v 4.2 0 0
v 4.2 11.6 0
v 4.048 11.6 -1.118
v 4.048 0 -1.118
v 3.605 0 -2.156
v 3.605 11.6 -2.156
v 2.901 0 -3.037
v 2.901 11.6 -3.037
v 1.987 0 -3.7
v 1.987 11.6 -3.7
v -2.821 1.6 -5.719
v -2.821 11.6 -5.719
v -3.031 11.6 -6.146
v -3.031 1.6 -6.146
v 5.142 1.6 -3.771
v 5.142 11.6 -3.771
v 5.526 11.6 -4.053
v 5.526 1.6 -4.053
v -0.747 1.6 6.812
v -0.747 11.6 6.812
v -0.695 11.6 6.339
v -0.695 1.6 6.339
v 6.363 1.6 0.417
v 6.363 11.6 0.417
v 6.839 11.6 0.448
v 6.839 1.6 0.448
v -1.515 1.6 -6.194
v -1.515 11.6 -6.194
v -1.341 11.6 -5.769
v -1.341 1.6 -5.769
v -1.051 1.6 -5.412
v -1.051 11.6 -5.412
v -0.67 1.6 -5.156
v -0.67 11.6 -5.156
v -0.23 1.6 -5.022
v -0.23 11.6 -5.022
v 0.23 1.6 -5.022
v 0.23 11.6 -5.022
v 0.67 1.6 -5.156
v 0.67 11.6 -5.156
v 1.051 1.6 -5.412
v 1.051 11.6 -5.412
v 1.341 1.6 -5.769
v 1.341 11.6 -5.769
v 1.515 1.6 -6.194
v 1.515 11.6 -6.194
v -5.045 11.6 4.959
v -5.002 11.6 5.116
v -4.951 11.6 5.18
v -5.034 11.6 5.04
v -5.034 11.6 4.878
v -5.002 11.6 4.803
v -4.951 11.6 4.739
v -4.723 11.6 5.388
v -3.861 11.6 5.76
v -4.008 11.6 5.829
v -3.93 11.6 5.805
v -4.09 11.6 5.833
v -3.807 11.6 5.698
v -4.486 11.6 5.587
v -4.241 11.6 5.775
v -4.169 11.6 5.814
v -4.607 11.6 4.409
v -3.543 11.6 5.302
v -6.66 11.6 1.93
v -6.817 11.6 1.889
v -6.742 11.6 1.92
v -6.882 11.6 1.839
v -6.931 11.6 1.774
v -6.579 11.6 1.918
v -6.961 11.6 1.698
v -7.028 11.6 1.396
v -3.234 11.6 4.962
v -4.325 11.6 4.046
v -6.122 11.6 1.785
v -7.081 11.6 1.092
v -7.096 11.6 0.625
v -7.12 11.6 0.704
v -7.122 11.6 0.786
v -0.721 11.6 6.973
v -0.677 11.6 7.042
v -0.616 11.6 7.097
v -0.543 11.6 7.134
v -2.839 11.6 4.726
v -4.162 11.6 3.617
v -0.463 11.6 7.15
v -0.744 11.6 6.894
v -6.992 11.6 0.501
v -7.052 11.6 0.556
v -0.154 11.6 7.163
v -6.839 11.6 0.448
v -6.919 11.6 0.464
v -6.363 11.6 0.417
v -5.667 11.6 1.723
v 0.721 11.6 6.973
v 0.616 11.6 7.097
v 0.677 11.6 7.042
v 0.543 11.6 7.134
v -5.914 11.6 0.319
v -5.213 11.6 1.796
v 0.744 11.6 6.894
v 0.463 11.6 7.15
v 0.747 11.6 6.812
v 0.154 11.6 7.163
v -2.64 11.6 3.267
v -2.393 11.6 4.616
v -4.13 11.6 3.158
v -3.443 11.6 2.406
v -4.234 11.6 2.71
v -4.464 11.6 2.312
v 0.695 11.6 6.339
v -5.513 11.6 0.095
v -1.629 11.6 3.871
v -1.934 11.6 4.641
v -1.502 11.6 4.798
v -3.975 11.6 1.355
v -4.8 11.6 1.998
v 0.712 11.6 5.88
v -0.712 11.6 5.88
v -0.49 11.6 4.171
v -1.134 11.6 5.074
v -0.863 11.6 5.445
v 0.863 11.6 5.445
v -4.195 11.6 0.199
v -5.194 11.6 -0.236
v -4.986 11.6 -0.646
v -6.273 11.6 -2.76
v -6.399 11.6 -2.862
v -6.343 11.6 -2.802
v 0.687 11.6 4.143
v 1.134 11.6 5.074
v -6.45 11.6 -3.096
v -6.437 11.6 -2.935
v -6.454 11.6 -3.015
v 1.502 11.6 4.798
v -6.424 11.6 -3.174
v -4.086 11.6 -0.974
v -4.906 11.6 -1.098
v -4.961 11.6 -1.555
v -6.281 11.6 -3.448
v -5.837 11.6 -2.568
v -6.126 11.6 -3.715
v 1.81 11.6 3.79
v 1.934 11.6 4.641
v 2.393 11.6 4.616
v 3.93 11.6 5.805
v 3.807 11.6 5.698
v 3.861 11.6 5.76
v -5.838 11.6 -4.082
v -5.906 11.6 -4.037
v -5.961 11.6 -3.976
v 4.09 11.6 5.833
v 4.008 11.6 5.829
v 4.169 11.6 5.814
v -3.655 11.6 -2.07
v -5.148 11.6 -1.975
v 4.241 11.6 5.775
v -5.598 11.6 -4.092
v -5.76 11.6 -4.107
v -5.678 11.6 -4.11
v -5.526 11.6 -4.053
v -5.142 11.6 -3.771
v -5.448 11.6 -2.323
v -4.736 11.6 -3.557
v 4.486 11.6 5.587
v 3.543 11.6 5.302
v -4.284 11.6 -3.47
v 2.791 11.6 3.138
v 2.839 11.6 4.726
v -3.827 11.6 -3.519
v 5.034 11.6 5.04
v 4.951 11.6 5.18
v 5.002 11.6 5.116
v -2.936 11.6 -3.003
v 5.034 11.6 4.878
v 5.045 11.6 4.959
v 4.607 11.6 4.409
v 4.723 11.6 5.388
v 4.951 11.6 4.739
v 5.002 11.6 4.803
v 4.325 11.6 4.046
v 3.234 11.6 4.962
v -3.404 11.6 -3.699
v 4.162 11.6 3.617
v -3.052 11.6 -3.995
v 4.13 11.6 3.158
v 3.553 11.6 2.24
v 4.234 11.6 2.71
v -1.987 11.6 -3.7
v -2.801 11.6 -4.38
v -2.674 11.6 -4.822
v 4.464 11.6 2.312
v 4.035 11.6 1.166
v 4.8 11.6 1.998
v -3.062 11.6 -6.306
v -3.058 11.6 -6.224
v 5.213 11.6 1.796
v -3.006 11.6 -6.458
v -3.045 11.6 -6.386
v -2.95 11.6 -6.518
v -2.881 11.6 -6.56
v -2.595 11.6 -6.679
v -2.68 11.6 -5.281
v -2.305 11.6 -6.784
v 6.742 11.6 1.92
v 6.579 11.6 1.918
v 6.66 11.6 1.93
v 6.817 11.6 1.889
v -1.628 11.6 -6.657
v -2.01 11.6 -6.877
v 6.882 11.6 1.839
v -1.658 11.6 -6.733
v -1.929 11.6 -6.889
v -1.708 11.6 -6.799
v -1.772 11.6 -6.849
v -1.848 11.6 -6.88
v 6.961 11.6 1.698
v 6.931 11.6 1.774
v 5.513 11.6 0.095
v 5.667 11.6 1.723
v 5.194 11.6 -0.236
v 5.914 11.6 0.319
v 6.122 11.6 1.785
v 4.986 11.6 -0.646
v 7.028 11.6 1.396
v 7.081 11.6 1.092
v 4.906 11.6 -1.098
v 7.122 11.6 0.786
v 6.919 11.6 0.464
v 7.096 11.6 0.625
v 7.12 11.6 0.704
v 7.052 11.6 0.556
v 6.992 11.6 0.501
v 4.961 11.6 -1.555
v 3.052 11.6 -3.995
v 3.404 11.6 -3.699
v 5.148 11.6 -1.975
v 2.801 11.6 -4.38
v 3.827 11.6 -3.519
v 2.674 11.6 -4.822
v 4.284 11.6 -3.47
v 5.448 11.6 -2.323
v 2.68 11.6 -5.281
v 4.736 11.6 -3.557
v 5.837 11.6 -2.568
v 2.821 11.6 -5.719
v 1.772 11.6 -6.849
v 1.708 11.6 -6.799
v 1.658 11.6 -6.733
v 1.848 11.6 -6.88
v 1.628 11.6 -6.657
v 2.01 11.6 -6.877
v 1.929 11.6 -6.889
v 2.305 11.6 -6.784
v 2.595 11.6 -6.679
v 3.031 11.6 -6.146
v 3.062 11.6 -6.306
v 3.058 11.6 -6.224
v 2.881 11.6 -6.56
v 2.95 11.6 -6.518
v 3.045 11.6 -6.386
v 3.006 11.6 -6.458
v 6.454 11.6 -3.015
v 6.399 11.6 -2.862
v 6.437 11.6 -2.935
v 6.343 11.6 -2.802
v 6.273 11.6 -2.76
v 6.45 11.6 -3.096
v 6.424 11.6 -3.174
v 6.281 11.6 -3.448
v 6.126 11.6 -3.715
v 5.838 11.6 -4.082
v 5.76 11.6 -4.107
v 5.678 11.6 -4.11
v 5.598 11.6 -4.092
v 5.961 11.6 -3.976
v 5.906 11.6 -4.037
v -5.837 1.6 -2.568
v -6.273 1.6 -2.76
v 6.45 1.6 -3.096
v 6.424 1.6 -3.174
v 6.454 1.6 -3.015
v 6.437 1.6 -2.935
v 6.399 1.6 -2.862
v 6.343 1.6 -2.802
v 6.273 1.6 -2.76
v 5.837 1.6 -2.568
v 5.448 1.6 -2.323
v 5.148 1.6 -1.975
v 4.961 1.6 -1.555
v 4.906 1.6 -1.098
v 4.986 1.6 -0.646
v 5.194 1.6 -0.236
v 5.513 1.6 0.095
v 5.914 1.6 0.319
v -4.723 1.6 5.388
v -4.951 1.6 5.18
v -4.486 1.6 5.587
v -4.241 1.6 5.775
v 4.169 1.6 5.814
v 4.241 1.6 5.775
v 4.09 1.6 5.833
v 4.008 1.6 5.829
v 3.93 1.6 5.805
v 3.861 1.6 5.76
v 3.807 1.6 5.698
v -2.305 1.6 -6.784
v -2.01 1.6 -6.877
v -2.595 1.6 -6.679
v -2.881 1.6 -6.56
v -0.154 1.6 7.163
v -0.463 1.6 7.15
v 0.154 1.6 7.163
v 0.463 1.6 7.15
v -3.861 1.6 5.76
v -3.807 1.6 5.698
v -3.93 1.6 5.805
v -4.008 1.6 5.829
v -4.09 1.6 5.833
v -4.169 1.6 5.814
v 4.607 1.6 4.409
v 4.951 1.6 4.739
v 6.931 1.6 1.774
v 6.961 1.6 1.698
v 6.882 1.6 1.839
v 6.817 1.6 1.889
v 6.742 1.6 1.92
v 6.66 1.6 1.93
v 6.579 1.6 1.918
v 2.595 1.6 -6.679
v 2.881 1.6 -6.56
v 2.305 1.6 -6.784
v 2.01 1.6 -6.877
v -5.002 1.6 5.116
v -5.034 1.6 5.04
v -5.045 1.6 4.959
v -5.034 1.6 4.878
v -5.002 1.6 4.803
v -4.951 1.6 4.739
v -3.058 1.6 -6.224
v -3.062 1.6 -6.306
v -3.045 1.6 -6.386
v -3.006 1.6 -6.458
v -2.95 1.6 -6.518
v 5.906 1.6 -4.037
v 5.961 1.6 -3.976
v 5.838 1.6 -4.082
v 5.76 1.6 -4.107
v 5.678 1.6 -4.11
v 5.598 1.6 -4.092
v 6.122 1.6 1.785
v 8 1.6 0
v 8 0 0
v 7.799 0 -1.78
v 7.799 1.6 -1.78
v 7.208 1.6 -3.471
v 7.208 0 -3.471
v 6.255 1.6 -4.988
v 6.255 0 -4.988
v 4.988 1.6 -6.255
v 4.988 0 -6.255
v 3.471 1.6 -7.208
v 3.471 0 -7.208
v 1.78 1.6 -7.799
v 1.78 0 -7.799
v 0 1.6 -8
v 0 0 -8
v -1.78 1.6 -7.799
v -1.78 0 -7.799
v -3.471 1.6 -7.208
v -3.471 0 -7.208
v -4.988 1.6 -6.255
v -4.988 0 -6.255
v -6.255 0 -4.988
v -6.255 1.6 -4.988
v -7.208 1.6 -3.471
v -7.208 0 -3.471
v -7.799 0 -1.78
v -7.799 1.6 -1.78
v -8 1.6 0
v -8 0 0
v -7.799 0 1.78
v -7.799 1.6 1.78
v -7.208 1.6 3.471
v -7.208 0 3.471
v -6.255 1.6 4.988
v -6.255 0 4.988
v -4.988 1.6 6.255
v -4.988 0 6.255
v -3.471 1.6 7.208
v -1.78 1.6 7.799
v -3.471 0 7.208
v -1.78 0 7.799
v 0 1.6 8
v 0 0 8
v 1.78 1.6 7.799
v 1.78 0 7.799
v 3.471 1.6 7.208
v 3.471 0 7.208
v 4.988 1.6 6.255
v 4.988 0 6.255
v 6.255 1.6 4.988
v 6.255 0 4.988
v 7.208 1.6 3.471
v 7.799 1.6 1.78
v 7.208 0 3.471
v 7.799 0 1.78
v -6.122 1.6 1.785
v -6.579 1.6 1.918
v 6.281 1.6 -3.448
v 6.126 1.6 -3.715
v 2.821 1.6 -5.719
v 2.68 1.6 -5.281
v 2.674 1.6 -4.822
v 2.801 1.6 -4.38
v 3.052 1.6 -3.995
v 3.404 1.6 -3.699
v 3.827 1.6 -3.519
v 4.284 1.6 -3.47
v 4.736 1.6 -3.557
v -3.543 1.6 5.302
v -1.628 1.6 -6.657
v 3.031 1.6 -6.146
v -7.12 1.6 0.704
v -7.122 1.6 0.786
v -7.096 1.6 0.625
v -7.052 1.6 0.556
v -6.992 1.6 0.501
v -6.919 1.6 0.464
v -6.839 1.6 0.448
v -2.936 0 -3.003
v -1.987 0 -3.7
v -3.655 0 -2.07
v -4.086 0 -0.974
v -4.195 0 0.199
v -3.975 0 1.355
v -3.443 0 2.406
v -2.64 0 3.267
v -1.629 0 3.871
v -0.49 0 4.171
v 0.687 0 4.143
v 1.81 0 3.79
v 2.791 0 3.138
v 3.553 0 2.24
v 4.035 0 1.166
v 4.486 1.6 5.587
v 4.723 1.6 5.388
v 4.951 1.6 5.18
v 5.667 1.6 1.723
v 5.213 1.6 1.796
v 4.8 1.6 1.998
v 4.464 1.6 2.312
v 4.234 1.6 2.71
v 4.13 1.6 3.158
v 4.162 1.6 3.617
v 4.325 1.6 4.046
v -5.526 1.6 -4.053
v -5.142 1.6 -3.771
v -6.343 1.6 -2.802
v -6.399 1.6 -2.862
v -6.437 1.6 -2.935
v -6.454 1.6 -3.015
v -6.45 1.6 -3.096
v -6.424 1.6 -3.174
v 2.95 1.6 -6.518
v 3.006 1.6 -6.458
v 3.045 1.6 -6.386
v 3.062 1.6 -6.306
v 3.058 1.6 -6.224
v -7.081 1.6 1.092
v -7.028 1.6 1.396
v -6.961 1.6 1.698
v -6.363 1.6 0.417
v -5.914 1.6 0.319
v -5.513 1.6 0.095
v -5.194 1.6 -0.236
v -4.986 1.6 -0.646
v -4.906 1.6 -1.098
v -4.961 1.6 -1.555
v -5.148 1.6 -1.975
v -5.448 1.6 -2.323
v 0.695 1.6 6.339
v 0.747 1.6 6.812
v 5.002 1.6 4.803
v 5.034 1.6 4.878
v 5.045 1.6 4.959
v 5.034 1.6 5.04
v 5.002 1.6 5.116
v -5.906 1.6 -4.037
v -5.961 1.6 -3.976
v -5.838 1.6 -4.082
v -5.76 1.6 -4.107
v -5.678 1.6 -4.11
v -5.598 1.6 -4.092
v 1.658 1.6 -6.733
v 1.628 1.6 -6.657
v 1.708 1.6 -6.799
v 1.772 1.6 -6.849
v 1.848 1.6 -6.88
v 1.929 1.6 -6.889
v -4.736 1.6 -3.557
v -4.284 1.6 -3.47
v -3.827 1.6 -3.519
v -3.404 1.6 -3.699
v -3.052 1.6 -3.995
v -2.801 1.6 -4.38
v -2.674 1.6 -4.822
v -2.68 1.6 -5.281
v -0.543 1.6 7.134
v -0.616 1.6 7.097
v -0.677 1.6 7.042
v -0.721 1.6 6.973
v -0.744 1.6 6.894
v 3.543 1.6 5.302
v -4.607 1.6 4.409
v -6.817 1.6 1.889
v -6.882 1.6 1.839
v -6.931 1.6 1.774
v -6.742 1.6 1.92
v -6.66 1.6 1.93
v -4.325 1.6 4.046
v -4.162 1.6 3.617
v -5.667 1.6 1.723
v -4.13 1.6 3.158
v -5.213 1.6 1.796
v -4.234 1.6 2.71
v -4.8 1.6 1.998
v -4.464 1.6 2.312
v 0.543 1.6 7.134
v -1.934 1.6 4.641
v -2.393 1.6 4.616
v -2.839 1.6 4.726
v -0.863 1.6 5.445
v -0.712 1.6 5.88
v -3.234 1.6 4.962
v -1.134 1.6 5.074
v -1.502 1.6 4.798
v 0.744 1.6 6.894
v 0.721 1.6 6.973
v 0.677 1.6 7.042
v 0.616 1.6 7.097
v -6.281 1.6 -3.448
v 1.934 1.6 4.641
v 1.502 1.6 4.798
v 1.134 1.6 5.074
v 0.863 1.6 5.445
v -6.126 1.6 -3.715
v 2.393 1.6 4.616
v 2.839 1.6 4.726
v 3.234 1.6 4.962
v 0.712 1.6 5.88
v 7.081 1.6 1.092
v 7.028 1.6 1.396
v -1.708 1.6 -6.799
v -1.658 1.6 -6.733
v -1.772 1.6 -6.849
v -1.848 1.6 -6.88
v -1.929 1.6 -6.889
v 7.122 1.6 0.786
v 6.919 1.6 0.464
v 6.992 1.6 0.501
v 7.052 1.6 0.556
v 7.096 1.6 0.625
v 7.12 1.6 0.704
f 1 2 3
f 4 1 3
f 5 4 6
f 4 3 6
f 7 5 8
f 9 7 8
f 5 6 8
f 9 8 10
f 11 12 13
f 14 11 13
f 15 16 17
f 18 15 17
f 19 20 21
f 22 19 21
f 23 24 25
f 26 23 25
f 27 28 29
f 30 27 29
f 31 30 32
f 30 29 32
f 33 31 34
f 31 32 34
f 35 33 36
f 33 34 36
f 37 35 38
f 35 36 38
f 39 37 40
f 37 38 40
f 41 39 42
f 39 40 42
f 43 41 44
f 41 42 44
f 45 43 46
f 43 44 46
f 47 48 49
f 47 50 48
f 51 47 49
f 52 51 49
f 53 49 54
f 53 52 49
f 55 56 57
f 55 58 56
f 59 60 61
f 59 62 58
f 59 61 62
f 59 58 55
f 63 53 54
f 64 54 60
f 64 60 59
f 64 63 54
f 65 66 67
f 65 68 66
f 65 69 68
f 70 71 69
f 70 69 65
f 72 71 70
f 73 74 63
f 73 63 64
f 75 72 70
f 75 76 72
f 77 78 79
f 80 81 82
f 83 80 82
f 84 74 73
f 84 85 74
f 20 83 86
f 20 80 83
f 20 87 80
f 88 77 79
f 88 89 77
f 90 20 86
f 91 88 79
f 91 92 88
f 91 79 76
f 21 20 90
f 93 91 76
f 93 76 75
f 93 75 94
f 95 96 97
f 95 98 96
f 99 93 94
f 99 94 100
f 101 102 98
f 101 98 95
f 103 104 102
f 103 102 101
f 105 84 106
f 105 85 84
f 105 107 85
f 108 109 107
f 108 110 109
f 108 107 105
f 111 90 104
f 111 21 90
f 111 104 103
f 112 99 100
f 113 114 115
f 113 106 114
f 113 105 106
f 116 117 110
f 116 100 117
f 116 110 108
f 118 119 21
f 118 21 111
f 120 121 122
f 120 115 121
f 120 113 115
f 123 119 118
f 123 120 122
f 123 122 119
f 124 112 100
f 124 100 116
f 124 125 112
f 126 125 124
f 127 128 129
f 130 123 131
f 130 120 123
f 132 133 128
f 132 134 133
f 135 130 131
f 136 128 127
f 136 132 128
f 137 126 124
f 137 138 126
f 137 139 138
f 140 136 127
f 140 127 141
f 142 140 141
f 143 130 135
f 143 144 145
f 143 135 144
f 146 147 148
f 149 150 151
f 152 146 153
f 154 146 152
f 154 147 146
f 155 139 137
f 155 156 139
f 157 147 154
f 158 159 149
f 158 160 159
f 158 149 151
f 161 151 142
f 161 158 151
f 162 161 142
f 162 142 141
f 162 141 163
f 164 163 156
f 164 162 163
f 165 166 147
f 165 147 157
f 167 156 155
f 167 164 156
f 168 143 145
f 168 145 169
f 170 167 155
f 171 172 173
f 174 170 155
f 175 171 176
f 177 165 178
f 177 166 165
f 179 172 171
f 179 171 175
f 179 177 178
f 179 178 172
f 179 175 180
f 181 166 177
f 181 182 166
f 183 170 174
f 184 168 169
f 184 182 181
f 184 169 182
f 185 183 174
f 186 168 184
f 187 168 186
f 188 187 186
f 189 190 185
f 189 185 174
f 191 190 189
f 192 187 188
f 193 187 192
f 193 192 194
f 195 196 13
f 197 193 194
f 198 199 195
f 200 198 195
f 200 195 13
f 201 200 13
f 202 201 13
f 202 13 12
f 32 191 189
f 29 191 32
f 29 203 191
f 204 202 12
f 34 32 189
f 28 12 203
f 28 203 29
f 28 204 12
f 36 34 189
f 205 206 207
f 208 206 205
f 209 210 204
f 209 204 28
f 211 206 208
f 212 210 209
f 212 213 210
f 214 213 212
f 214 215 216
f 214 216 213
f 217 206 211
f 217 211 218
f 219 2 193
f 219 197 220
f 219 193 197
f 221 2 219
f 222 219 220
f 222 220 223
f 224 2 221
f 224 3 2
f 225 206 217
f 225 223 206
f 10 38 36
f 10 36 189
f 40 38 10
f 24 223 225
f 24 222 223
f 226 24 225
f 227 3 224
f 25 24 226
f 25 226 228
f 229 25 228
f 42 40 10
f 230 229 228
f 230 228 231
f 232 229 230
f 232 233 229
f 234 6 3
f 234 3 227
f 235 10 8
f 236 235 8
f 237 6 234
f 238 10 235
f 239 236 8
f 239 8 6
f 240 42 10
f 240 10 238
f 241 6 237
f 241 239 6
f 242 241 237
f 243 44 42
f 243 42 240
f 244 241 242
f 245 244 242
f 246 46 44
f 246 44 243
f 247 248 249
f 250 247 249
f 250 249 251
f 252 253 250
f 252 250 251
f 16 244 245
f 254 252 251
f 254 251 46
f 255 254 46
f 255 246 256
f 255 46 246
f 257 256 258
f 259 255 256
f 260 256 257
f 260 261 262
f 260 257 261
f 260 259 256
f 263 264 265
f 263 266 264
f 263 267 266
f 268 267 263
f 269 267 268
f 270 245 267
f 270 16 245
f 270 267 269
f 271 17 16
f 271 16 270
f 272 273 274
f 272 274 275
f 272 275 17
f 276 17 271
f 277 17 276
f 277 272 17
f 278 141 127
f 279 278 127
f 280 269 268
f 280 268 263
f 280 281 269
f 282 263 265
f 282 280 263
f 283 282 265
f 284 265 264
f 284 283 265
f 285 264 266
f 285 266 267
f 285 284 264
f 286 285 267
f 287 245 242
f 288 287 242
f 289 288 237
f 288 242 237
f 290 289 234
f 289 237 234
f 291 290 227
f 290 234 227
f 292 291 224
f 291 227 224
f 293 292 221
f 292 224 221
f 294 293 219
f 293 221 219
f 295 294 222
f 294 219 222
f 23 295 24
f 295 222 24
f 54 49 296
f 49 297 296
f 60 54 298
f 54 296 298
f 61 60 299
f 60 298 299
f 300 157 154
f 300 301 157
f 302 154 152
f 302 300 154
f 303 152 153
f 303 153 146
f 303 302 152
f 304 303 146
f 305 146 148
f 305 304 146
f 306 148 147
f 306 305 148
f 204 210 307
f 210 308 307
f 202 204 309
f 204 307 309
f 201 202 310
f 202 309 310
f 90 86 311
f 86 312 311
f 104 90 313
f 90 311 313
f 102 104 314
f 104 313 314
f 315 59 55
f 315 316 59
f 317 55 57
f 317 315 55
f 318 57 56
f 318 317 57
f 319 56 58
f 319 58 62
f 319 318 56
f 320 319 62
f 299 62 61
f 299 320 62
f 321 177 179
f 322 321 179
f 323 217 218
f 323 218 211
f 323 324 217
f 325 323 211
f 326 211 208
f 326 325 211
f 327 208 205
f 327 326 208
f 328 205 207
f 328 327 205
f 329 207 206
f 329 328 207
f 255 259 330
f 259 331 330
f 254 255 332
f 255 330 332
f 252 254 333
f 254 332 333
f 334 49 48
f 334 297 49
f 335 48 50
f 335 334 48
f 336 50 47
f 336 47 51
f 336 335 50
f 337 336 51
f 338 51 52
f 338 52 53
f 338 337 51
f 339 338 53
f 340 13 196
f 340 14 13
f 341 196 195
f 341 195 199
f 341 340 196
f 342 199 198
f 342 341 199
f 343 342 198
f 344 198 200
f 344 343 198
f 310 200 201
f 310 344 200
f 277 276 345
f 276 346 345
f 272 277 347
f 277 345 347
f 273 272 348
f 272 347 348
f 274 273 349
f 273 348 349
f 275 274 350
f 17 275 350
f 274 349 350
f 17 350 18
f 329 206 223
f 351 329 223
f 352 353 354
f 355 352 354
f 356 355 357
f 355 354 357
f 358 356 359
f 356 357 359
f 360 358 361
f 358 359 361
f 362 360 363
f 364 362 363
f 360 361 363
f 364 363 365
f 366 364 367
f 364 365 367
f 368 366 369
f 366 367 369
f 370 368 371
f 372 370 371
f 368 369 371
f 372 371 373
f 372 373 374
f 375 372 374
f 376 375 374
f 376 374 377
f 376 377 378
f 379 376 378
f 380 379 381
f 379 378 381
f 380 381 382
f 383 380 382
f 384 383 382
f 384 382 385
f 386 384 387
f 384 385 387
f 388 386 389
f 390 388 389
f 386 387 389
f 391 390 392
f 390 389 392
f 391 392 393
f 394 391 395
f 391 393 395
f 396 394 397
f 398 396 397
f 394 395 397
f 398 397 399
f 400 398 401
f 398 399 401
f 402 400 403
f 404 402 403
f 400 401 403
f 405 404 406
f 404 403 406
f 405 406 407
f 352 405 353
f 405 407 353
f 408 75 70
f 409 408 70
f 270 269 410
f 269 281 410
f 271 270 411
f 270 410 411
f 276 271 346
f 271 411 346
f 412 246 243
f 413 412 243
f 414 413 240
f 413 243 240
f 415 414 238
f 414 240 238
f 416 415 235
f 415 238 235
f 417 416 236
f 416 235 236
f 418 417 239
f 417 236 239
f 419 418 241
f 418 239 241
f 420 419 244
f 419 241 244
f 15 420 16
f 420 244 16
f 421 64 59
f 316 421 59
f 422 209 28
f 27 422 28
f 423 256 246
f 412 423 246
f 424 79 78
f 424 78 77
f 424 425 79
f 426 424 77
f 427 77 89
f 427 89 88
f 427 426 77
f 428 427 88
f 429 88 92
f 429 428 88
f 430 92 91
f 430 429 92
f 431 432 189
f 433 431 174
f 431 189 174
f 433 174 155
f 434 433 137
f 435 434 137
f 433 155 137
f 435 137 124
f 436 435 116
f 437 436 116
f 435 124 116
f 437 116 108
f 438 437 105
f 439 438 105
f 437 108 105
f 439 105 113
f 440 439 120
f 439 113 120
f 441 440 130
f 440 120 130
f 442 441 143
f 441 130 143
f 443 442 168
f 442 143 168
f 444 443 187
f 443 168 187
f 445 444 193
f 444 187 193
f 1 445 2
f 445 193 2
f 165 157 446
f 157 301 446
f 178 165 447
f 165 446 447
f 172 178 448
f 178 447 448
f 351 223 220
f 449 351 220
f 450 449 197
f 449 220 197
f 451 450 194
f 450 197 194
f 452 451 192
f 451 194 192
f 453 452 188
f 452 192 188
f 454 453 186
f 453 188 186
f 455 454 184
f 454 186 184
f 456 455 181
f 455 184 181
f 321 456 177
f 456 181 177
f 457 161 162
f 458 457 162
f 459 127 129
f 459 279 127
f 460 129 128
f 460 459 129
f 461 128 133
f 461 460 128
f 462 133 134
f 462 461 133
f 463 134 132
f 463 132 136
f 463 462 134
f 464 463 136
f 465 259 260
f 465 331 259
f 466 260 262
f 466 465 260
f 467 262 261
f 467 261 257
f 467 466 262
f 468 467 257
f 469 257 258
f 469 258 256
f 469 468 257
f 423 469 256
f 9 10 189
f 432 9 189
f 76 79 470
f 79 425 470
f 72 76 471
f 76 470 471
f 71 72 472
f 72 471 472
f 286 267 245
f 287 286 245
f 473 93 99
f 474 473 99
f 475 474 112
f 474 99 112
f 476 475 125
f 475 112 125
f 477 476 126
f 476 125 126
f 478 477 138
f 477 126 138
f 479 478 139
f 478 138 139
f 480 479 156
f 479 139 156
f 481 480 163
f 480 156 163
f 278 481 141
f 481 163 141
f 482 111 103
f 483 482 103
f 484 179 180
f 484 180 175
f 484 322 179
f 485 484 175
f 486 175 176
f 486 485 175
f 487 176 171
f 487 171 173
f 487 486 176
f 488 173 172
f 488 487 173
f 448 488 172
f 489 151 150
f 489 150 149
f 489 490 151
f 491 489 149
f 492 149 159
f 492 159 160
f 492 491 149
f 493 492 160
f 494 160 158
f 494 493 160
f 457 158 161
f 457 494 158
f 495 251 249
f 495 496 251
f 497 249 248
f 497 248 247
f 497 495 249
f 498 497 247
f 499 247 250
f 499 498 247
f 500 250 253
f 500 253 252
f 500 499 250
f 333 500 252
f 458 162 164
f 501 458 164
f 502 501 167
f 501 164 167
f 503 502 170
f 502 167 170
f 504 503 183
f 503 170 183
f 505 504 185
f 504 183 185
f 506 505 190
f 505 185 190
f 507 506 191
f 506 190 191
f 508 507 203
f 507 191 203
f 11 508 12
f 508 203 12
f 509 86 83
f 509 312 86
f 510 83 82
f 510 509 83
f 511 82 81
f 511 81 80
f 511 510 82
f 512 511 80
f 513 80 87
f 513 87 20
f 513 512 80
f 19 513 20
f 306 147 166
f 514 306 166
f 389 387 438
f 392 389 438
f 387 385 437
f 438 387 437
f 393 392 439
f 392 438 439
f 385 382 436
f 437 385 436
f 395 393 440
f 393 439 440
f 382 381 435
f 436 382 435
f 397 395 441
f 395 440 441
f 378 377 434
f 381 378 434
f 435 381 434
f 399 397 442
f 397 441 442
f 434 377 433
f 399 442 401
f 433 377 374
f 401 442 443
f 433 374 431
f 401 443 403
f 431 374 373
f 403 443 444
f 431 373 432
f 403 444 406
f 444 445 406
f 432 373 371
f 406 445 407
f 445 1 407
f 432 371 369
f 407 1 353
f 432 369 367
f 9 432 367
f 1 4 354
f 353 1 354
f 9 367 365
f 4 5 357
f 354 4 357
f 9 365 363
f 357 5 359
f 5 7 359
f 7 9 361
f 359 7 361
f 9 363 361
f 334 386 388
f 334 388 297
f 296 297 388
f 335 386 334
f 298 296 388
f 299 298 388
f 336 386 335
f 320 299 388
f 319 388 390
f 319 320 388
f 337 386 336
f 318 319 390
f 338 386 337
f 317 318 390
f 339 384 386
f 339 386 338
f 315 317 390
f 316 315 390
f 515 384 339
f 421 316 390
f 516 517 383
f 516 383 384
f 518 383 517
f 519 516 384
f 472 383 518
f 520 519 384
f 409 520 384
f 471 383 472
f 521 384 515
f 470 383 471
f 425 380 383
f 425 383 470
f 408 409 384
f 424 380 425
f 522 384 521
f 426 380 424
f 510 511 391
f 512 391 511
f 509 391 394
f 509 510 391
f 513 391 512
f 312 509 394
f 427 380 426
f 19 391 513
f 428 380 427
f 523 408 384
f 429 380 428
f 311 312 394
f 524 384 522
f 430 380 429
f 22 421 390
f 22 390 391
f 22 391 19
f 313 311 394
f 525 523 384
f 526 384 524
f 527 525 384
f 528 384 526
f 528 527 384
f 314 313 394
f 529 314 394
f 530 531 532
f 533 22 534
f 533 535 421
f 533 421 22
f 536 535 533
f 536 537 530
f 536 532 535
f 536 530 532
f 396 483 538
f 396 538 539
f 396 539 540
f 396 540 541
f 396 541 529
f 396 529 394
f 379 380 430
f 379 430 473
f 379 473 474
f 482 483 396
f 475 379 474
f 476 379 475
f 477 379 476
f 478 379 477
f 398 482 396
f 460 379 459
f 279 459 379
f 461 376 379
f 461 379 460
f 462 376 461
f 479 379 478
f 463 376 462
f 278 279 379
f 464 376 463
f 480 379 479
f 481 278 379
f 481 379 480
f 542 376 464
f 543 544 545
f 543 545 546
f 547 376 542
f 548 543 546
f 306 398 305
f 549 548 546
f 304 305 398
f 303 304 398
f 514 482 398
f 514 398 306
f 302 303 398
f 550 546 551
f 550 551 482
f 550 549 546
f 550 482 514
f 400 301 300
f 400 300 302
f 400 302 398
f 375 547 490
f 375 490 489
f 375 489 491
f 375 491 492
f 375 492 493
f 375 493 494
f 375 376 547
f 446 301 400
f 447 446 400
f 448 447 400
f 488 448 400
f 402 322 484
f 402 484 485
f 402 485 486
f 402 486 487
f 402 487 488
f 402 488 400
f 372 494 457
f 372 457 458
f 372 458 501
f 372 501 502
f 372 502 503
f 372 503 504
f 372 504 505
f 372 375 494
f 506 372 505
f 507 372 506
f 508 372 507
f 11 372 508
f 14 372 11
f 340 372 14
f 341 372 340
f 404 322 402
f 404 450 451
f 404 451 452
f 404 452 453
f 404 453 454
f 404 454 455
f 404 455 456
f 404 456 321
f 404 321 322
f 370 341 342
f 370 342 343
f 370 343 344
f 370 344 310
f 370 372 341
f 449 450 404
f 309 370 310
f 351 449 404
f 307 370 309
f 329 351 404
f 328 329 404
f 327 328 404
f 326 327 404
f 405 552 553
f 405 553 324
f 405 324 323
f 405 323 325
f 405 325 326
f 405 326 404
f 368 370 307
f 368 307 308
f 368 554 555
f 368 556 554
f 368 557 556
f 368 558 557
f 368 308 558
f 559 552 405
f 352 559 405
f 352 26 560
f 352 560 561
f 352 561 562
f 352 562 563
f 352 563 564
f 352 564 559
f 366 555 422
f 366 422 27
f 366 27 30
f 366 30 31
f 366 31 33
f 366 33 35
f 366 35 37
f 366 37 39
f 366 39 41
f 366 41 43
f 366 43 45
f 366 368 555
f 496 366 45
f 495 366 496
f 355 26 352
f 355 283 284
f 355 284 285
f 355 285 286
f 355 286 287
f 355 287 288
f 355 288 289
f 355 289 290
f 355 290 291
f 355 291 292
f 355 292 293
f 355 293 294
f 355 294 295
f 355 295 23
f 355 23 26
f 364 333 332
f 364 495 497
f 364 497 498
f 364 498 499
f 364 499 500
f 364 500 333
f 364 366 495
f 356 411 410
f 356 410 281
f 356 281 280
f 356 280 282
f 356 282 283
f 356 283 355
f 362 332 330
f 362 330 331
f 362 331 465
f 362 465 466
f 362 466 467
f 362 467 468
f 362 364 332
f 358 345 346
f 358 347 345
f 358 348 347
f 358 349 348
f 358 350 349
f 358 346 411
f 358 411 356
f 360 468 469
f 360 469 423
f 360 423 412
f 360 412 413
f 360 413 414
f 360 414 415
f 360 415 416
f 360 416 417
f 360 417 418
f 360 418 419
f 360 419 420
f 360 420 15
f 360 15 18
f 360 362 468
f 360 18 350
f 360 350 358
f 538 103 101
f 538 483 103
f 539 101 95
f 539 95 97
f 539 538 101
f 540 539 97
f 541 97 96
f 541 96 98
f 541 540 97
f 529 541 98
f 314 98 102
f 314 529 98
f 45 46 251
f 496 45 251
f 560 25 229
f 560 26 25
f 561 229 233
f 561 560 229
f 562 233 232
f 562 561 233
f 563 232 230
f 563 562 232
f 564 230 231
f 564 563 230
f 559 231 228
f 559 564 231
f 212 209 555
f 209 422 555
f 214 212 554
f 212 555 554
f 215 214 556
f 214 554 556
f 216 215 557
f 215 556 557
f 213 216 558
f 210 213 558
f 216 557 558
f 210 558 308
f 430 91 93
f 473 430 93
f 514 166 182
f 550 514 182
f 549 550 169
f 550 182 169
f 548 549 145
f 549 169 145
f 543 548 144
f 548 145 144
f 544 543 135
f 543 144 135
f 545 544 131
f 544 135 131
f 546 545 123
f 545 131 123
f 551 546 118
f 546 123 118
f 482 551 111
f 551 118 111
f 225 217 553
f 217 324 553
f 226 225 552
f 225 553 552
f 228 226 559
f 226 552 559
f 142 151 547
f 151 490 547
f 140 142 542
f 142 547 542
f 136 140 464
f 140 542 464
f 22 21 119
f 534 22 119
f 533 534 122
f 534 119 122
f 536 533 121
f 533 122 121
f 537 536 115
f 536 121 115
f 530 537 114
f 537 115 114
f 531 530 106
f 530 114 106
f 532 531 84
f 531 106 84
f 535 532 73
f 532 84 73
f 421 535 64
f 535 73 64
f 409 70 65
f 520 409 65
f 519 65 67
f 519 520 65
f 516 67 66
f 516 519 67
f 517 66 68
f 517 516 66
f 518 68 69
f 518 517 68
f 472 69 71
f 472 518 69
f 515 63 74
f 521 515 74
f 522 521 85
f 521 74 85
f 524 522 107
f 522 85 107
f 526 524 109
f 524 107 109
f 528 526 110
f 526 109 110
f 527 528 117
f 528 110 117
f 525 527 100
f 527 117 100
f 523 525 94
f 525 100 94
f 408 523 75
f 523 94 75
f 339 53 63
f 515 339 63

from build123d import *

# Parameters (mm, degrees)
SKETCH_1_R                       = 8
EXTRUDE_1_DEPTH                  = 1.6
SKETCH_2_R                       = 7.165
EXTRUDE_2_DEPTH                  = 10
CUT_EXTRUDE_1_DEPTH              = 17.20370328
CUT_EXTRUDE_START                = -10
CUT_EXTRUDE_2_DEPTH              = 10
FILLET_1_R                       = 0.305
PATTERN_CIRCULAR_1_COUNT         = 9
FILLET_1_OF_PATTERN_CIRCULAR_1_R = 0.305


with BuildPart() as part:
    # Эскиз1 → Бобышка-Вытянуть1 (new body)
    with BuildSketch(Plane(origin=(0, 0, 0), x_dir=(1, 0, 0), z_dir=(0, 1, 0))):
        Circle(SKETCH_1_R)
    extrude(amount=EXTRUDE_1_DEPTH)

    # Эскиз2 → Бобышка-Вытянуть2 (add)
    with BuildSketch(Plane(origin=(0, 1.6, 0), x_dir=(1, 0, 0), z_dir=(0, 1, 0))):
        Circle(SKETCH_2_R)
    extrude(amount=EXTRUDE_2_DEPTH)

    # Эскиз3 → Вырез-Вытянуть1 (cut, through all)
    with BuildSketch(Plane(origin=(0, 11.6, 0), x_dir=(1, 0, 0), z_dir=(0, 1, 0))):
        with BuildLine():
            Line((1.987460691, 3.7), (-1.987460691, 3.7))
            ThreePointArc((-1.987460691, 3.7), (-2.155535327, -3.604673002), (4.2, 0))
            ThreePointArc((4.2, 0), (3.604673002, 2.155535327), (1.987460691, 3.7))
        make_face()
    extrude(amount=-CUT_EXTRUDE_1_DEPTH, mode=Mode.SUBTRACT)

    # Эскиз4 → Вырез-Вытянуть2 (cut)
    with BuildSketch(Plane(origin=(0, 11.6, 0), x_dir=(1, 0, 0), z_dir=(0, 1, 0)).offset(CUT_EXTRUDE_START)):
        with BuildLine():
            Line((-1.702574257, 6.959774845), (-1.51531734, 6.19430692))
            ThreePointArc((-1.51531734, 6.19430692), (2.8e-08, 5.005), (1.515317353, 6.194306973))
            Line((1.515317353, 6.194306973), (1.702574257, 6.959774845))
            ThreePointArc((1.702574257, 6.959774845), (0, 7.165), (-1.702574257, 6.959774845))
        make_face()
    cut_extrude_2 = extrude(amount=CUT_EXTRUDE_2_DEPTH, mode=Mode.SUBTRACT)

    # Скругление1
    fillet_1_edges = [part.edges().sort_by_distance(p)[0] for p in [
        (-1.702574257, 6.6, -6.959774845),
        (1.702574257, 6.6, -6.959774845),
    ]]
    fillet(fillet_1_edges, radius=FILLET_1_R)

    # Круговой массив1: Вырез-Вытянуть2 ×9 about axis
    pattern_circular_1_axis = Axis((0, 0, 0), (0, 1, 0))
    for i in range(1, PATTERN_CIRCULAR_1_COUNT):
        add(cut_extrude_2.rotate(pattern_circular_1_axis, i * 360 / PATTERN_CIRCULAR_1_COUNT), mode=Mode.SUBTRACT)

    # Скругление1 of Круговой массив1
    fillet_1_of_pattern_circular_1_edges = [part.edges().sort_by_distance(p)[0] for p in [
        (-5.777904586, 6.6, -4.237103208),
        (-3.169409488, 6.6, -6.425890483),
        (-7.149689144, 6.6, 0.46815611),
        (-6.55839131, 6.6, -2.885260548),
        (-5.176054692, 6.6, 4.954359981),
        (-6.878628949, 6.6, 2.005414864),
        (-0.780486724, 6.6, 7.122363756),
        (-3.980279656, 6.6, 5.957734373),
        (3.980279656, 6.6, 5.957734373),
        (0.780486724, 6.6, 7.122363756),
        (6.878628949, 6.6, 2.005414864),
        (5.176054692, 6.6, 4.954359981),
        (6.55839131, 6.6, -2.885260548),
        (7.149689144, 6.6, 0.46815611),
        (3.169409488, 6.6, -6.425890483),
        (5.777904586, 6.6, -4.237103208),
    ]]
    fillet(fillet_1_of_pattern_circular_1_edges, radius=FILLET_1_OF_PATTERN_CIRCULAR_1_R)


solid = part.part
